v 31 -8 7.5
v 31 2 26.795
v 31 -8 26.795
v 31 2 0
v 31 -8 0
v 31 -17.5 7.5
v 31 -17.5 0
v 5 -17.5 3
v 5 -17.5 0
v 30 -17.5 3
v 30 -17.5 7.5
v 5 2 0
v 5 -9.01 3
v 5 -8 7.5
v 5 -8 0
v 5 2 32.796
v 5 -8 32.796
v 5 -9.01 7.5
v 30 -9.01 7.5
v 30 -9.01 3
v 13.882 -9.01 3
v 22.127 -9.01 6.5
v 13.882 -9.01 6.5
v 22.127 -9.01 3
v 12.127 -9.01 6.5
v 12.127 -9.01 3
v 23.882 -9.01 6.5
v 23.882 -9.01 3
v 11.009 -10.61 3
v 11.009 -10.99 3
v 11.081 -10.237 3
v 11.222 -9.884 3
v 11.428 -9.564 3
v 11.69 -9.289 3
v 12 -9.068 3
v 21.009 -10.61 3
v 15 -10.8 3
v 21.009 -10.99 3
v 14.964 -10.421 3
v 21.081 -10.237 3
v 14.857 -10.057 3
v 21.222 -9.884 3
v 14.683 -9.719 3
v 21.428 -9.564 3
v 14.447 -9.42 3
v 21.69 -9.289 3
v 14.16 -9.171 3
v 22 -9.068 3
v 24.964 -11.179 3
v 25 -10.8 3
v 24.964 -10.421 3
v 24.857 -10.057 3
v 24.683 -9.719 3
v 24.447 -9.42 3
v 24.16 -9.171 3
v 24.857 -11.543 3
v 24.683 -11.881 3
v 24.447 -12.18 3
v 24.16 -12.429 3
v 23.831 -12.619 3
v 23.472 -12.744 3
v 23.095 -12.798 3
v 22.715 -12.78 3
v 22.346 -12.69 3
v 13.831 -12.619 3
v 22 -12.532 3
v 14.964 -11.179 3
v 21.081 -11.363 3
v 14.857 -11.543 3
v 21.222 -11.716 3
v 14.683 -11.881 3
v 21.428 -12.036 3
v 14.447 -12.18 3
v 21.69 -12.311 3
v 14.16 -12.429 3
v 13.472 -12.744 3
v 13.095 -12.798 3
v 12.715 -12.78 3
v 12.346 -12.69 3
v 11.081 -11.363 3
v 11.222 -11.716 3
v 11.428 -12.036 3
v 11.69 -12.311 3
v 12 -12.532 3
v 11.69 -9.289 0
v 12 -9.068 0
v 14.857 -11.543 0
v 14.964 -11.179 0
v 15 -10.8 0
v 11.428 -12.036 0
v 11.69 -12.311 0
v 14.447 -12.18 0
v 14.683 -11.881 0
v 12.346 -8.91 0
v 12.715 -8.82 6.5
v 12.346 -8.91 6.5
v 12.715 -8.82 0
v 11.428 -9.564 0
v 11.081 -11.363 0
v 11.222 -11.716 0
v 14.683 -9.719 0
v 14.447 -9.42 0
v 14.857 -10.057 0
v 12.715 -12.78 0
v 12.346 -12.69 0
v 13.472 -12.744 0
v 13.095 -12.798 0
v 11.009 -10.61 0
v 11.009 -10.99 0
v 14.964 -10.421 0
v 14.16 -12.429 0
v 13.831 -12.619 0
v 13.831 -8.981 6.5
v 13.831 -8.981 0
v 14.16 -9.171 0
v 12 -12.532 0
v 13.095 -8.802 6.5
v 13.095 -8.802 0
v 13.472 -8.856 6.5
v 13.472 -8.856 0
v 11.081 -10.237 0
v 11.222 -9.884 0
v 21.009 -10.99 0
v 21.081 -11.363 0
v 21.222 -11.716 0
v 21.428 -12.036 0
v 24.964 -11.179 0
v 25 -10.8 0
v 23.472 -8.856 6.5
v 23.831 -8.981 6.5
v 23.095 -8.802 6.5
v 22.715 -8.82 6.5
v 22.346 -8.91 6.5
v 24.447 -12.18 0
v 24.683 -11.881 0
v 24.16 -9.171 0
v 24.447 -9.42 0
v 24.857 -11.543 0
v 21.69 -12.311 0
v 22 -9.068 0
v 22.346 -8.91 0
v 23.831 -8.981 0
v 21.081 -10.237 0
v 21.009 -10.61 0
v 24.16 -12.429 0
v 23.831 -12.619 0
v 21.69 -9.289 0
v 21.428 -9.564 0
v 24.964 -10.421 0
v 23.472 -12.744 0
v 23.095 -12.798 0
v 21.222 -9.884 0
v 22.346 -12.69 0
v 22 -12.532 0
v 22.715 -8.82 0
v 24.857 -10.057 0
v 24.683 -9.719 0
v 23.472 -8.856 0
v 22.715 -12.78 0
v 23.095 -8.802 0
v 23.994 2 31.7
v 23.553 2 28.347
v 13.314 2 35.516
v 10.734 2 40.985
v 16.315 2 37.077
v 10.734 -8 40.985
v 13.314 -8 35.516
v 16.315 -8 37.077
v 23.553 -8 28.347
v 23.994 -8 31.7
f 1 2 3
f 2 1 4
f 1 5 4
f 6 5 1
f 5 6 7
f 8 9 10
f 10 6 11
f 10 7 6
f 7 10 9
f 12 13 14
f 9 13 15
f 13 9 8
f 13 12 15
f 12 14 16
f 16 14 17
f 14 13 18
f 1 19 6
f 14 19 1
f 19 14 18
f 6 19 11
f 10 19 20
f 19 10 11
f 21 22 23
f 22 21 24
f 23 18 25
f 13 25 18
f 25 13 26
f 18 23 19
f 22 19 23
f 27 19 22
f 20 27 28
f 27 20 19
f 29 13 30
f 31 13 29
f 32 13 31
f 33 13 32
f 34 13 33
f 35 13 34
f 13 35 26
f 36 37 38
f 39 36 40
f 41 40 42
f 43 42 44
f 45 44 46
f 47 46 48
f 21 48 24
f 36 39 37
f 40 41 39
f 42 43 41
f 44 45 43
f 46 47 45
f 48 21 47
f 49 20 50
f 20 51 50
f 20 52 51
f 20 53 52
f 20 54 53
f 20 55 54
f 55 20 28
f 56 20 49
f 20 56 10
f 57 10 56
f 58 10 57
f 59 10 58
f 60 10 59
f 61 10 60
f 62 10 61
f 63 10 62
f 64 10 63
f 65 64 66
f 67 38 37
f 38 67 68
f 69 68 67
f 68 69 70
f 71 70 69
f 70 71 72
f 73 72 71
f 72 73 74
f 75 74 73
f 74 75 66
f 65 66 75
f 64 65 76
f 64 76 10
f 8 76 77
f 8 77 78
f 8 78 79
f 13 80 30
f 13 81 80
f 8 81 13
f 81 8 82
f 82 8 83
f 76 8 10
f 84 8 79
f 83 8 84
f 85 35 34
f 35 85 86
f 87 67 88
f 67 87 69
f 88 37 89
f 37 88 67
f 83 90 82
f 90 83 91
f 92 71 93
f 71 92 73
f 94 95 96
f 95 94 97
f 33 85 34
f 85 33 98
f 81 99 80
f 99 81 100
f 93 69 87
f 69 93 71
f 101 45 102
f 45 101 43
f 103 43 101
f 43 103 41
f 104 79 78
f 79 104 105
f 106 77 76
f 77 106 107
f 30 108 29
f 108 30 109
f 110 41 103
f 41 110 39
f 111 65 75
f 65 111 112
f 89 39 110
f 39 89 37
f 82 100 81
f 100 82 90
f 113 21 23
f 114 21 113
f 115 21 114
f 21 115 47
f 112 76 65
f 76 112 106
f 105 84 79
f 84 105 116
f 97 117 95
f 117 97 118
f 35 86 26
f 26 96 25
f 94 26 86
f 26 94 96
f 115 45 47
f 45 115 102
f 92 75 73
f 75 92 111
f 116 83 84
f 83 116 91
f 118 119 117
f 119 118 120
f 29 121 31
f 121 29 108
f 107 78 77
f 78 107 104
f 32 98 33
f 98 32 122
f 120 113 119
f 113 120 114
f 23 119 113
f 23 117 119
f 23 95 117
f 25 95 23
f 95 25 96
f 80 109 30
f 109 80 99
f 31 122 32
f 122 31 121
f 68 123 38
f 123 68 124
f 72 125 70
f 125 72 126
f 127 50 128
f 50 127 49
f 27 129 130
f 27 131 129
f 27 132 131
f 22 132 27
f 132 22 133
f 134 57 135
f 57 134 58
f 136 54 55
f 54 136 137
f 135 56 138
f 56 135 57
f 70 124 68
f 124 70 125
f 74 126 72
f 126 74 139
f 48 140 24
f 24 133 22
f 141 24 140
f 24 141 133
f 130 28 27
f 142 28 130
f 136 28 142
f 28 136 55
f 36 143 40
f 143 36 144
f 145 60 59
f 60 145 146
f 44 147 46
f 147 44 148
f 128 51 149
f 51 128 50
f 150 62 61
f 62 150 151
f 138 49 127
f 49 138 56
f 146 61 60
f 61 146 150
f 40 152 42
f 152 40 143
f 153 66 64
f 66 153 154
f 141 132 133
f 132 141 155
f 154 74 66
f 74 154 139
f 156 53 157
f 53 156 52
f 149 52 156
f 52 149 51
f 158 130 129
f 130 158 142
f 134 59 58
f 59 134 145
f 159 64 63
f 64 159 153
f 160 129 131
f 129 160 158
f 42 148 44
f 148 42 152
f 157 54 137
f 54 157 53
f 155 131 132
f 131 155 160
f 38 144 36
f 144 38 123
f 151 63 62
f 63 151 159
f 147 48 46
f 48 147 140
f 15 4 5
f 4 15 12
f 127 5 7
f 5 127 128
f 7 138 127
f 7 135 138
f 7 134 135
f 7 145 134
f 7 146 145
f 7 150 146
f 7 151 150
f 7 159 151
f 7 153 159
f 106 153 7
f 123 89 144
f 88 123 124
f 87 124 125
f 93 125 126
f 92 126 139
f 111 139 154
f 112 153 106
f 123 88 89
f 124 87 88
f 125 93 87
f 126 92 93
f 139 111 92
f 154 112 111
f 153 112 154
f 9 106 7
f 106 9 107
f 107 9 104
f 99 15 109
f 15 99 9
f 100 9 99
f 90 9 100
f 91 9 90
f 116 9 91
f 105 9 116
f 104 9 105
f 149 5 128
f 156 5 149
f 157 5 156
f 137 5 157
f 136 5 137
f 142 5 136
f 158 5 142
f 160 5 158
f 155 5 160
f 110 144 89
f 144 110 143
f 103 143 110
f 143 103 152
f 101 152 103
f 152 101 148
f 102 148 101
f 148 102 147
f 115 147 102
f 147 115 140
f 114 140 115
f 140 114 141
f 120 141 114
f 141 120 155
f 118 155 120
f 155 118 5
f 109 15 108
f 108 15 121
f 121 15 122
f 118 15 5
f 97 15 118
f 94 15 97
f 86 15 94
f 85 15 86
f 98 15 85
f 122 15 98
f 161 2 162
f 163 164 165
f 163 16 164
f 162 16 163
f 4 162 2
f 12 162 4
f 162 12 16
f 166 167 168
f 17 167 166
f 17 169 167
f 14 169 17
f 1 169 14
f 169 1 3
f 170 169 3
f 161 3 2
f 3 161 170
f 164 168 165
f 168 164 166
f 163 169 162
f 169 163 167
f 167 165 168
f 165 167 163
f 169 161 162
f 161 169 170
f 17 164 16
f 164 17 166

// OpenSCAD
//=================================================================================
// LedFeet.scad
//
// Feet for an LED strip light.
//
// Dr Tom Flint, 23 Nov 2025
//=================================================================================


F2=99;


//-----------------------------------------------------------------------------------
module LedFeet(){
  
wide=36;
thick=1.5;
gap=8;

hi=45;
ang=35;

  // staple attachment
  rotate([90,0,0])
  difference(){
    translate([0,-3,-0.5])
    difference(){
      translate([-(26-wide)/2,0,gap])
      cube([26,7*thick,10]);
      translate([-(24-wide)/2-4,4*thick,gap+thick+0.01])
      cube([24+4,7*thick,10-thick]);
      translate([(wide-10)/2,3*thick,gap+3.3])
      rotate([90,0,0])
      cylinder(r=2,h=10,center=true,$fn=33);
      translate([(wide-10)/2+10,3*thick,gap+3.3])
      rotate([90,0,0])
      cylinder(r=2,h=10,center=true,$fn=33);
    }
    translate([-2,-4*thick,gap-2])
    cube([34,4*thick,15]);
  }
    
  difference(){  
    translate([5,-8,0])
    cube([26,10,hi]); 

    // main topcut
    translate([5,-8,hi])
    rotate([0,ang,0])
    cube([45,20,hi]); 

    // cut for strip
    translate([5,-18,hi])
    rotate([0,ang,0])
    translate([12,5,-3])
    //~ #cube([13,26,hi]); 
    translate([13/2,26/2,0])
    linear_extrude(scale=[0.5,1],height=6)
    square([12.5,26],center=true);

    // cut extra tip off
    translate([5,-18,hi])
    rotate([0,ang,0])
    translate([-6,5,-12])
    cube([13,26,hi]); 
    
    //~ translate([3,0,21])
    //~ rotate([90,0,0])
    //~ #cylinder(r=12,h=30,center=true,$fn=F2);
    //~ translate([32,0,18])
    //~ rotate([90,0,0])
    //~ #cylinder(r=8,h=30,center=true,$fn=F2);
  }

  
}

//=================================================================================

LedFeet();

//=================================================================================
